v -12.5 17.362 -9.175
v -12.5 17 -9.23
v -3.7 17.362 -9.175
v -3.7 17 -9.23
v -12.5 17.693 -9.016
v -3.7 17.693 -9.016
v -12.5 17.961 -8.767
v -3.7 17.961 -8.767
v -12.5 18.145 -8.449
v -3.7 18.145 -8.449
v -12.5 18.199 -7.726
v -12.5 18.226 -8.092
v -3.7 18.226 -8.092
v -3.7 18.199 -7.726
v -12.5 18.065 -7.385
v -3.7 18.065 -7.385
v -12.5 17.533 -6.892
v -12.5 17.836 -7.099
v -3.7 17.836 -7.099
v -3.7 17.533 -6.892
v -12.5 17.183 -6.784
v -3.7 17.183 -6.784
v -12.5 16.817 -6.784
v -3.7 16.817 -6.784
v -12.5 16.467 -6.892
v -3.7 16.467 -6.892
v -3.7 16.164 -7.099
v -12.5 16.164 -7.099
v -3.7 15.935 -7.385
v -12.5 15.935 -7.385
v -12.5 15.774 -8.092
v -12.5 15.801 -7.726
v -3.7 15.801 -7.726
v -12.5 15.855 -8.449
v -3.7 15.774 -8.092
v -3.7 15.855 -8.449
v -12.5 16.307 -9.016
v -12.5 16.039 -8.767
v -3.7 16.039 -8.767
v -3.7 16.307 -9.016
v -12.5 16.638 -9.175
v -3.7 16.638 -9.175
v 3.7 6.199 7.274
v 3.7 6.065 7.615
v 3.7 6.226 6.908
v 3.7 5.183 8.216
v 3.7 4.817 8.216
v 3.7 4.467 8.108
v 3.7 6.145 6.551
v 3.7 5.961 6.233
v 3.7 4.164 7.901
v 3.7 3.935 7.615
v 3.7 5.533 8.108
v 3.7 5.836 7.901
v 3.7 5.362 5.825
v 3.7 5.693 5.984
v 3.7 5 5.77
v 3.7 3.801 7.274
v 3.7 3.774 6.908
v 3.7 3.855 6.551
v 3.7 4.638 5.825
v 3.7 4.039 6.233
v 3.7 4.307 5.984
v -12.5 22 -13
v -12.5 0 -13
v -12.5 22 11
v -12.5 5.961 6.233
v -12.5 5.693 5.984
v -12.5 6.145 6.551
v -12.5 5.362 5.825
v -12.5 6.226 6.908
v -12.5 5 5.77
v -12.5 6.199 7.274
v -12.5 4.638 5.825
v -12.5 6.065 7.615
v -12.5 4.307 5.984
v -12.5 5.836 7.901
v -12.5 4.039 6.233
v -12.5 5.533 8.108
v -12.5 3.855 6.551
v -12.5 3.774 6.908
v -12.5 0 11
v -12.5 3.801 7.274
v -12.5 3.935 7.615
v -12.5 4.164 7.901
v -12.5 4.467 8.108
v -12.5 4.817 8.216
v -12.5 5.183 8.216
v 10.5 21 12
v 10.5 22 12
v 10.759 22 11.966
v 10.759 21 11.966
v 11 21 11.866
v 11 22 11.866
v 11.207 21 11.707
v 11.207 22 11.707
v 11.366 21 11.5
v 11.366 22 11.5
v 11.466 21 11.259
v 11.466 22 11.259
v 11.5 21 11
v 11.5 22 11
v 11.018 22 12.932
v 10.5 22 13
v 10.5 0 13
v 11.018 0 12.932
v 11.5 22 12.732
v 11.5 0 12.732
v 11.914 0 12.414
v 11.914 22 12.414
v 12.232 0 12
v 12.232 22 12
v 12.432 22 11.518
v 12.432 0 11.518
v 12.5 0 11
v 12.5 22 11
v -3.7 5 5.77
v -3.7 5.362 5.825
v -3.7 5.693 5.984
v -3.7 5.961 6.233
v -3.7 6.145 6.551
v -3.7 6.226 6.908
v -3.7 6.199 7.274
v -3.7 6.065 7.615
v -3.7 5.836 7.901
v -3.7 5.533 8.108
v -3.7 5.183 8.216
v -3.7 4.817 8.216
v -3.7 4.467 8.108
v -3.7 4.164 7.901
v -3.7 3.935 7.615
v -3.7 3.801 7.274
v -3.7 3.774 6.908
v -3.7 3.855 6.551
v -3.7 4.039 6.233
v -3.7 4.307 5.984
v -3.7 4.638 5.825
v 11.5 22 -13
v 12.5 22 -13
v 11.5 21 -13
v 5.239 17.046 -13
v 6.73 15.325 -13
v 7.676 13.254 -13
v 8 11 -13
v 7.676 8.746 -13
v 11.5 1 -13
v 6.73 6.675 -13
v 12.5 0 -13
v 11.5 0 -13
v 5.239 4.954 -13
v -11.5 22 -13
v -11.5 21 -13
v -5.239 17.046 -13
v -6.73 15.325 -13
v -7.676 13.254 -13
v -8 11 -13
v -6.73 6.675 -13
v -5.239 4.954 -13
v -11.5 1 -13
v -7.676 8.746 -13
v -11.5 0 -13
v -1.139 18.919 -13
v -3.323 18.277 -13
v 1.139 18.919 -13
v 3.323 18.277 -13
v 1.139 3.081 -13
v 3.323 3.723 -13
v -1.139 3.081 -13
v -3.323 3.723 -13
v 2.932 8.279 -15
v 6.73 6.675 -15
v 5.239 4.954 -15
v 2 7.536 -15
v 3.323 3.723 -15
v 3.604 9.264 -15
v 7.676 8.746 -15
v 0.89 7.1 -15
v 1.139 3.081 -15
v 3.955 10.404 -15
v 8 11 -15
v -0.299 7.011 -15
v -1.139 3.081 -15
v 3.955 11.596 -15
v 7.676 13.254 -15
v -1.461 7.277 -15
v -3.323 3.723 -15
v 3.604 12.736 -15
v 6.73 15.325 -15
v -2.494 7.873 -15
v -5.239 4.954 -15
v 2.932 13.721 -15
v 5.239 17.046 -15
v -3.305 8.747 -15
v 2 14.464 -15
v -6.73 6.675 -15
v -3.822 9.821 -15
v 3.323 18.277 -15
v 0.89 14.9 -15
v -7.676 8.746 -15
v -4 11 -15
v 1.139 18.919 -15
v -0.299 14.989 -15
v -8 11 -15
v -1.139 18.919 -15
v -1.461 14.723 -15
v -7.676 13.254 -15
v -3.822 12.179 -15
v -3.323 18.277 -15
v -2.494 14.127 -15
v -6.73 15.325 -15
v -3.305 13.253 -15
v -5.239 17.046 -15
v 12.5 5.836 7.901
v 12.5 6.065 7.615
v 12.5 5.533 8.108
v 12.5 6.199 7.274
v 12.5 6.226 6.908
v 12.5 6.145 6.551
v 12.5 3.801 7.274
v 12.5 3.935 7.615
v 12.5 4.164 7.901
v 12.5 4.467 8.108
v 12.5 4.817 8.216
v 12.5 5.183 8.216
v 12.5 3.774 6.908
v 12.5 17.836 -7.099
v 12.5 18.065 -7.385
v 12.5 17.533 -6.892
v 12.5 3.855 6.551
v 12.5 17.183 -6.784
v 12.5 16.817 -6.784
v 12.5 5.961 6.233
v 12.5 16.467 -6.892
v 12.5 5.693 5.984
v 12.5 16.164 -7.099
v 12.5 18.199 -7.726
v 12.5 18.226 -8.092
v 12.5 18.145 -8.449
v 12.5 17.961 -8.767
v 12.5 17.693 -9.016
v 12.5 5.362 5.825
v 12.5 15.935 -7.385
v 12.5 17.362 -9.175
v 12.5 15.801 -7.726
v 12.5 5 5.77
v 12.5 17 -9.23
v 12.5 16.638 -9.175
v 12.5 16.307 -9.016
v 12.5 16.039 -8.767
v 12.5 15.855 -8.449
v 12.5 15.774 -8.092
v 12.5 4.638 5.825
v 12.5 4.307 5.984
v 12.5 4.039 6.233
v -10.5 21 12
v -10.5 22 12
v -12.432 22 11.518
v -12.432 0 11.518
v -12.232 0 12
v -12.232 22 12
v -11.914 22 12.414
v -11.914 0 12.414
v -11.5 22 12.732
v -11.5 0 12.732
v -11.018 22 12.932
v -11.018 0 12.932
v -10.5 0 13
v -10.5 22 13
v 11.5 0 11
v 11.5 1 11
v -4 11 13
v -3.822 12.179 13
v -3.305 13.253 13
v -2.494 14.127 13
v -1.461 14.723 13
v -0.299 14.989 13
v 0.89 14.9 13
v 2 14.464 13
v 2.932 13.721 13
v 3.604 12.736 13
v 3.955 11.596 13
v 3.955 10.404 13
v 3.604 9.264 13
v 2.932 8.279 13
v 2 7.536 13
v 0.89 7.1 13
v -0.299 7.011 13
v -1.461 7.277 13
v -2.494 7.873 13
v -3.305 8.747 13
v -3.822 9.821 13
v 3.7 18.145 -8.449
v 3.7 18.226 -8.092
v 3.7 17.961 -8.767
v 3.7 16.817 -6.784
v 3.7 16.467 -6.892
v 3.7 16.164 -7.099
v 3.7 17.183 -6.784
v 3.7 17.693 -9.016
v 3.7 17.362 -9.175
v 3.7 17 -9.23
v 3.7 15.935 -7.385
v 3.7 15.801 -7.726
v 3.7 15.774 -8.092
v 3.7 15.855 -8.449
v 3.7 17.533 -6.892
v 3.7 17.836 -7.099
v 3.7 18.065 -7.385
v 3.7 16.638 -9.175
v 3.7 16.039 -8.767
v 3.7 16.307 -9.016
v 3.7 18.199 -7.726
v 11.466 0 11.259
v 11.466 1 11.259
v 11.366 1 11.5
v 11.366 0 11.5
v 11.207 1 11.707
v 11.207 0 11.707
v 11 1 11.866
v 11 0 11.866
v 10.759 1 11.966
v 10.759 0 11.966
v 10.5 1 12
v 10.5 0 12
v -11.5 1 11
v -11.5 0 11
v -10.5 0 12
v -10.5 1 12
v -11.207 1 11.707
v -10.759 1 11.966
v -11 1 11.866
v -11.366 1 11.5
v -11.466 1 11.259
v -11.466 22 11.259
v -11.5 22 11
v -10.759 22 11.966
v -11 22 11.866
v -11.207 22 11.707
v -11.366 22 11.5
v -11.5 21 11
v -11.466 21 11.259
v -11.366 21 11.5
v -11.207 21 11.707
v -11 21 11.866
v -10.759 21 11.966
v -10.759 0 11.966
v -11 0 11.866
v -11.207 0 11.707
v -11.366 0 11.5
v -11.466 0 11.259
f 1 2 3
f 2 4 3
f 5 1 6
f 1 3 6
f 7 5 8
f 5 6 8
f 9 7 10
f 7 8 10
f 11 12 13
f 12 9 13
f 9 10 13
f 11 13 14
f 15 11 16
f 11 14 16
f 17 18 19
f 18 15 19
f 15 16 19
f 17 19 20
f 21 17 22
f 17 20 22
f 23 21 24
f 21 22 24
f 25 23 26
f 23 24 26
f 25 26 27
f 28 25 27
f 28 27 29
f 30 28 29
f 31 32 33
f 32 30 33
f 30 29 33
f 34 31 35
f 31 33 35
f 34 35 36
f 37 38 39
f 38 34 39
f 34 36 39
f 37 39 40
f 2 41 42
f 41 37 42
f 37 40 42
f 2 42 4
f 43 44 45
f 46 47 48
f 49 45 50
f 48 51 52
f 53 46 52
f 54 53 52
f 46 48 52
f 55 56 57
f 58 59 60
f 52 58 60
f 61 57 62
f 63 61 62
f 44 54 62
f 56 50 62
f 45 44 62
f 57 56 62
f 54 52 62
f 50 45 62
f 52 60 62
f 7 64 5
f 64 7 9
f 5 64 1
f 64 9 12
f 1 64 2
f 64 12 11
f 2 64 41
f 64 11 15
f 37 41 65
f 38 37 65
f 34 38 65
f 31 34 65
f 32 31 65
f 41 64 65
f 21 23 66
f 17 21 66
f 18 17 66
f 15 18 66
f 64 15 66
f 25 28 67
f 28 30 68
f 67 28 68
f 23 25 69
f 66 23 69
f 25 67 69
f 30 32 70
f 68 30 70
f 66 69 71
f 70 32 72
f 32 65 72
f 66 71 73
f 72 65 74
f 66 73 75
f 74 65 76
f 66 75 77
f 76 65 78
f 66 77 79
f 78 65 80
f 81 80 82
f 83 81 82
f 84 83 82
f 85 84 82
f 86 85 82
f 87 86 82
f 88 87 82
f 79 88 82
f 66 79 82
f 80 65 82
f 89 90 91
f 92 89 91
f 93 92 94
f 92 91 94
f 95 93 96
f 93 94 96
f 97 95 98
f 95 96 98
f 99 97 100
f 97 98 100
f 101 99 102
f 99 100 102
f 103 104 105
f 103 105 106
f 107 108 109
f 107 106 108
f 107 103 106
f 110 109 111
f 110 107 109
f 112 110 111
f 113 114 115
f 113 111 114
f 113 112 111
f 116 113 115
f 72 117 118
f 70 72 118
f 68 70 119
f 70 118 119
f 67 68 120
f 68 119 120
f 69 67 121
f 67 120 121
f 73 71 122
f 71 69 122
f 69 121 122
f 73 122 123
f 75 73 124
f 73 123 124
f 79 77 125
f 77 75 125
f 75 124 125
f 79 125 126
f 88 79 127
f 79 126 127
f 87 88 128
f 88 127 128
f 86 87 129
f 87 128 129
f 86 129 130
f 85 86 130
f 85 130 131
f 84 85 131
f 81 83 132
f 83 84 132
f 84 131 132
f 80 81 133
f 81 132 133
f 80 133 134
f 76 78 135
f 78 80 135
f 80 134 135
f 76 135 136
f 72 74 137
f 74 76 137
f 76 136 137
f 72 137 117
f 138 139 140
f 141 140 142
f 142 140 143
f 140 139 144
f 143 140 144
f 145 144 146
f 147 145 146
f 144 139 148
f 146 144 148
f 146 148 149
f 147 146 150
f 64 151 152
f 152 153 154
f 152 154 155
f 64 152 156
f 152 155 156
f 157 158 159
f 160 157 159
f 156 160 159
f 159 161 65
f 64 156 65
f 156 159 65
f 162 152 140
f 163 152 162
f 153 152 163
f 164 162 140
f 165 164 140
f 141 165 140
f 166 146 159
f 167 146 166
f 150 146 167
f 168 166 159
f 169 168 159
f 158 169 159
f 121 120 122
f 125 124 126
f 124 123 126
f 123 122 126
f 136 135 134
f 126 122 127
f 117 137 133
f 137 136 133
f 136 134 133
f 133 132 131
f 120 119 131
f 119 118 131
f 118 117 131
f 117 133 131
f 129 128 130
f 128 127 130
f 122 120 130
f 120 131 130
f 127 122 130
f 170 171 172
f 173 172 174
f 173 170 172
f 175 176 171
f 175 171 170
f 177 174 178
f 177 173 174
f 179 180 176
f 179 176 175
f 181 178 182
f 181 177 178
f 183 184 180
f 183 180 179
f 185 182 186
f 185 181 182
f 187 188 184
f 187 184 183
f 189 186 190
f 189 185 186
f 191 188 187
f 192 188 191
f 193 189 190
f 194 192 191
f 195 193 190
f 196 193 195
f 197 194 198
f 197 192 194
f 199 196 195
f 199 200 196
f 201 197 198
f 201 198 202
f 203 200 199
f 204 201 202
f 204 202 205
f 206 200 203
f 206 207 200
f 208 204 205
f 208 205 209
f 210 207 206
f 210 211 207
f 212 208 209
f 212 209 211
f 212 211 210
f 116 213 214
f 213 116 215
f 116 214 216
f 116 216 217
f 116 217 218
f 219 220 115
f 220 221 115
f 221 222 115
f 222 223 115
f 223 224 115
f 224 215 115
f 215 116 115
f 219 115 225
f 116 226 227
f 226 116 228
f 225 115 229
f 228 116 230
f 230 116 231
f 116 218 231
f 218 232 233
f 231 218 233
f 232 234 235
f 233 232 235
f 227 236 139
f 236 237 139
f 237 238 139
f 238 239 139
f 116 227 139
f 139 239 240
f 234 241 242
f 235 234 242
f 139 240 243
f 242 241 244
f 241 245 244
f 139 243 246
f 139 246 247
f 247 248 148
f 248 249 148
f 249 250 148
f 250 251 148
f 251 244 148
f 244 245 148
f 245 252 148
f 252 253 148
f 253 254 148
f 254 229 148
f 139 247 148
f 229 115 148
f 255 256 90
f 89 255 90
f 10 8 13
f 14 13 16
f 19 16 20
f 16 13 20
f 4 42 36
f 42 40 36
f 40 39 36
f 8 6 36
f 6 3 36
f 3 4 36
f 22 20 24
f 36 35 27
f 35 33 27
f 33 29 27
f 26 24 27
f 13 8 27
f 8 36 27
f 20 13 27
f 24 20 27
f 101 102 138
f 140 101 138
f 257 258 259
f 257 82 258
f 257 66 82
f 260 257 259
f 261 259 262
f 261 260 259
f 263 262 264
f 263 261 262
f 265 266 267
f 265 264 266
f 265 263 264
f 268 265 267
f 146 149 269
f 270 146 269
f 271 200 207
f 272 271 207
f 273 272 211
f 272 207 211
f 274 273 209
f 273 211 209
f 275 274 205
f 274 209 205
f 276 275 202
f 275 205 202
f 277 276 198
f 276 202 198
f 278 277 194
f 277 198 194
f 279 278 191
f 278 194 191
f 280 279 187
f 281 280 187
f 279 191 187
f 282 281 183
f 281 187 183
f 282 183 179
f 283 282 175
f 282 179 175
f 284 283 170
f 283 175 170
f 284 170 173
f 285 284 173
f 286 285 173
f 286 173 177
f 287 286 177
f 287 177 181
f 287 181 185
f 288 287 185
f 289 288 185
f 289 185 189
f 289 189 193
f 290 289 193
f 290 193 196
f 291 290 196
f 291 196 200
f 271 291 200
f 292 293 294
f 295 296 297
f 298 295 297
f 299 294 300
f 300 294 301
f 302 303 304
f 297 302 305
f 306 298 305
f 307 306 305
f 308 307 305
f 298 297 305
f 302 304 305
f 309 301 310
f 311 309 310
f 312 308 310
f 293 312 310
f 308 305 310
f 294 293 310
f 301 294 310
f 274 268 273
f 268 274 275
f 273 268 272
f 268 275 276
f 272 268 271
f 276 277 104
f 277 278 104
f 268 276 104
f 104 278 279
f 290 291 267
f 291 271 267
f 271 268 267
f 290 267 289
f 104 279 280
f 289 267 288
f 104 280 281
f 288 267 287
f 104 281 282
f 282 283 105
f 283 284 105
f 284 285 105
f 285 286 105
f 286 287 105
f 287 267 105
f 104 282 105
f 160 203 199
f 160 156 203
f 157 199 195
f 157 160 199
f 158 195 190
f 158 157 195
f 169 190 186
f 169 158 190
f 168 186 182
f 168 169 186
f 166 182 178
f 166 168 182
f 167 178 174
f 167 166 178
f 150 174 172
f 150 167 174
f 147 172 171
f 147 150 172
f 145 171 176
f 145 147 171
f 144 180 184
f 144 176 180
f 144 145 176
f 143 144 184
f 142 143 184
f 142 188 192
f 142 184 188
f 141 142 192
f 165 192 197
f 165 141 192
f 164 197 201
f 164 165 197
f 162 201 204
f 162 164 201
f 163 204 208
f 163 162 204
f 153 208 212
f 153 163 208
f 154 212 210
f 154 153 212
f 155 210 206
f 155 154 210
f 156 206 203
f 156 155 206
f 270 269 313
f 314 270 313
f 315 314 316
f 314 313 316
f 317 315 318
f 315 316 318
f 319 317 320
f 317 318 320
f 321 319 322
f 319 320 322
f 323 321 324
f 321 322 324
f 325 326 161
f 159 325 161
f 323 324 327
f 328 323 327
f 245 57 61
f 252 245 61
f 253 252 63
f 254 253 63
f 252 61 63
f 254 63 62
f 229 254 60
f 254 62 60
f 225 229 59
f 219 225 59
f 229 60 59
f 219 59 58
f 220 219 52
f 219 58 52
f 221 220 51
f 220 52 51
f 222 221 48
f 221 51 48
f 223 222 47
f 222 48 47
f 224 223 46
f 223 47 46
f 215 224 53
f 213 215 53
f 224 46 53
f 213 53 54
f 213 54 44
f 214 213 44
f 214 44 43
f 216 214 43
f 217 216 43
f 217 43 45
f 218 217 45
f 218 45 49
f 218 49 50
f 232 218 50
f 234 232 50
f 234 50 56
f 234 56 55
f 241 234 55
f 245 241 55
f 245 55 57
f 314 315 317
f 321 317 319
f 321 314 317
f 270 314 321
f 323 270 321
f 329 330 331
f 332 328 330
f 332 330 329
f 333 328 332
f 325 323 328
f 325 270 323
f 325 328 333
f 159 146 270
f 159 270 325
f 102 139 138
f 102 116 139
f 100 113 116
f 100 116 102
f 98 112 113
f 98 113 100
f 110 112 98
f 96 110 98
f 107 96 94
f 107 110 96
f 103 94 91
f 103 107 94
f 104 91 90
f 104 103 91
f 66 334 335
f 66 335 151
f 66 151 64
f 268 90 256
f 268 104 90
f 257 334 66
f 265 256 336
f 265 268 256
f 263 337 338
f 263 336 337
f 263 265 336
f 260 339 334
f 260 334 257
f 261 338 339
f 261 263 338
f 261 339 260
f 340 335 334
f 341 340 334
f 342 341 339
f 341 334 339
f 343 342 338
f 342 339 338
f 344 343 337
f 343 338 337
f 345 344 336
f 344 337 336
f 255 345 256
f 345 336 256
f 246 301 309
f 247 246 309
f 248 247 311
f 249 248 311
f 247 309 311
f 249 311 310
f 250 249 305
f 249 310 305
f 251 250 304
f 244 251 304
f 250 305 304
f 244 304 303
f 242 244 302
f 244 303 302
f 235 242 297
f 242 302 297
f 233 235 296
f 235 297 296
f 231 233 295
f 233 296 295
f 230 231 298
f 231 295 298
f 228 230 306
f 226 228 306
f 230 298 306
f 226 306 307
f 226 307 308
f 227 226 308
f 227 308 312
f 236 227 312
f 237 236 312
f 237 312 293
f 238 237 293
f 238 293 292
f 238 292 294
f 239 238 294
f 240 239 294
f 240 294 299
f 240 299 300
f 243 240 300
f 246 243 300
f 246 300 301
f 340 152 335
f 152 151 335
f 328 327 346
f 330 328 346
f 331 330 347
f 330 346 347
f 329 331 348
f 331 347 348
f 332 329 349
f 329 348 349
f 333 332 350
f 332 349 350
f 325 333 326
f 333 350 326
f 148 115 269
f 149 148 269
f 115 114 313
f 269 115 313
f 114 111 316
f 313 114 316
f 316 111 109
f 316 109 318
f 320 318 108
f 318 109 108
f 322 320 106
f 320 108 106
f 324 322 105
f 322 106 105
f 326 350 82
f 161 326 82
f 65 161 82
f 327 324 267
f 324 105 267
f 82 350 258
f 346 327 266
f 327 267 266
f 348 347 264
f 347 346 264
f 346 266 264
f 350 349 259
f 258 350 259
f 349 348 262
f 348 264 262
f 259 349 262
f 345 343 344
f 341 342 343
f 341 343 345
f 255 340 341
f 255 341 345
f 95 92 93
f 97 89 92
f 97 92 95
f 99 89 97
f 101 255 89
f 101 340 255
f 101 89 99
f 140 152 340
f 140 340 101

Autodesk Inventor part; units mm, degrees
ref_plane "YZ Plane" through (0, 0, 0) normal (1, 0, 0) x (0, 1, 0)
ref_plane "XY Plane" through (0, 0, 0) normal (0, 0, 1) x (1, 0, 0)
sketch "Sketch2" plane through (0, 0, 0) normal (0, 1, 0) x (-1, 0, 0)
  line L0 (-12.5, -13) -> (12.5, -13)
  line L1 (12.5, -13) -> (12.5, 13)
  line L2 (12.5, 13) -> (-12.5, 13)
  line L3 (-12.5, 13) -> (-12.5, -13)
  line L4 (-12.5, -13) -> (12.5, 13) construction
  line L5 (12.5, -13) -> (-12.5, 13) construction
  point P0 (0, 0)
  dimension "d0" = 25
  dimension "d1" = 26
extrude "Extrusion1" add sketch "Sketch2" along normal blind 22
sketch "Sketch3" plane through (12.5, 0, 13) normal (1, 0, 0) x (0, 0, -1)
  line L0 (0, 0) -> (26, 0) projected
  line L1 (0, 22) -> (26, 22) projected
  line L2 (0, 0) -> (0, 22) projected
  point P0 (13, 0)
  point P1 (6, 5)
  point P2 (21, 17)
  dimension "d4" = 12
  dimension "d5" = 5
  dimension "d6" = 5
  dimension "d7" = 6
  dimension "d8" = 15
hole "Hole1" at (12.5, 5, 7) at (12.5, 17, -8) direction (-1, 0, 0) diameter 2.459 depth 8.8 thread size "M3x0.5" class "6H" standard "ISO Metric profile"
mirror "Mirror1" about plane through (0, 0, 0) normal (1, 0, 0) of "Hole1"
fillet "Fillet1" radius 2 2 edges at (12.5, 11, 13) (-12.5, 11, 13)
sketch "Sketch4" plane through (0, 22, 0) normal (0, 1, 0) x (1, 0, 0)
  arc A0 (-12.5, -11) -> (-10.5, -13) centre (-10.5, -11) ccw construction
  line L0 (-10.5, -13) -> (10.5, -13) construction
  arc A1 (10.5, -13) -> (12.5, -11) centre (10.5, -11) ccw construction
  line L1 (12.5, -11) -> (12.5, 13) construction
  line L2 (12.5, 13) -> (-12.5, 13) construction
  line L3 (-12.5, 13) -> (-12.5, -11) construction
  arc A2 (-11.5, -11) -> (-10.5, -12) centre (-10.5, -11) ccw
  line L4 (-10.5, -12) -> (10.5, -12)
  arc A3 (10.5, -12) -> (11.5, -11) centre (10.5, -11) ccw
  line L5 (11.5, -11) -> (11.5, 12)
  line L6 (11.5, 12) -> (-11.5, 12)
  line L7 (-11.5, 12) -> (-11.5, -11)
  line L8 (12.5, 13) -> (-12.5, 13) projected
  line L9 (-11.5, 12) -> (11.5, 12)
  line L10 (11.5, 12) -> (11.5, 13)
  line L11 (11.5, 13) -> (-11.5, 13)
  line L12 (-11.5, 13) -> (-11.5, 12)
  point P0 (0, 0)
  dimension "d17" = 1
extrude "Extrusion2" cut sketch "Sketch4" against normal blind 1
ref_plane "Work Plane1" through (0, 11, 0) normal (0, 1, 0) x (-1, 0, 0)
mirror "Mirror2" about plane through (0, 11, 0) normal (0, 1, 0) of "Extrusion2"
sketch "Sketch5" plane through (-12.5, 0, -13) normal (0, 0, -1) x (-1, 0, 0)
  line L0 (-25, 0) -> (-25, 22) construction
  line L1 (0, 0) -> (0, 22) construction
  line L2 (-25, 0) -> (0, 22) construction
  line L3 (-25, 22) -> (-24, 22) construction
  line L4 (-25, 22) -> (0, 0) construction
  circle A0 centre (-12.5, 11) radius 8
  point P0 (-12.5, 0)
  dimension "d21" = 16
extrude "Extrusion3" add sketch "Sketch5" along normal blind 2
sketch "Sketch6" plane through (0, 11, -15) normal (0, 0, -1) x (-1, 0, 0)
  circle A0 centre (0, 0) radius 4
  point P0 (0, -11)
  dimension "d24" = 8
extrude "Extrusion4" cut sketch "Sketch6" against normal through all
equation "\"d5\" = d6"
properties part number "main_block"
